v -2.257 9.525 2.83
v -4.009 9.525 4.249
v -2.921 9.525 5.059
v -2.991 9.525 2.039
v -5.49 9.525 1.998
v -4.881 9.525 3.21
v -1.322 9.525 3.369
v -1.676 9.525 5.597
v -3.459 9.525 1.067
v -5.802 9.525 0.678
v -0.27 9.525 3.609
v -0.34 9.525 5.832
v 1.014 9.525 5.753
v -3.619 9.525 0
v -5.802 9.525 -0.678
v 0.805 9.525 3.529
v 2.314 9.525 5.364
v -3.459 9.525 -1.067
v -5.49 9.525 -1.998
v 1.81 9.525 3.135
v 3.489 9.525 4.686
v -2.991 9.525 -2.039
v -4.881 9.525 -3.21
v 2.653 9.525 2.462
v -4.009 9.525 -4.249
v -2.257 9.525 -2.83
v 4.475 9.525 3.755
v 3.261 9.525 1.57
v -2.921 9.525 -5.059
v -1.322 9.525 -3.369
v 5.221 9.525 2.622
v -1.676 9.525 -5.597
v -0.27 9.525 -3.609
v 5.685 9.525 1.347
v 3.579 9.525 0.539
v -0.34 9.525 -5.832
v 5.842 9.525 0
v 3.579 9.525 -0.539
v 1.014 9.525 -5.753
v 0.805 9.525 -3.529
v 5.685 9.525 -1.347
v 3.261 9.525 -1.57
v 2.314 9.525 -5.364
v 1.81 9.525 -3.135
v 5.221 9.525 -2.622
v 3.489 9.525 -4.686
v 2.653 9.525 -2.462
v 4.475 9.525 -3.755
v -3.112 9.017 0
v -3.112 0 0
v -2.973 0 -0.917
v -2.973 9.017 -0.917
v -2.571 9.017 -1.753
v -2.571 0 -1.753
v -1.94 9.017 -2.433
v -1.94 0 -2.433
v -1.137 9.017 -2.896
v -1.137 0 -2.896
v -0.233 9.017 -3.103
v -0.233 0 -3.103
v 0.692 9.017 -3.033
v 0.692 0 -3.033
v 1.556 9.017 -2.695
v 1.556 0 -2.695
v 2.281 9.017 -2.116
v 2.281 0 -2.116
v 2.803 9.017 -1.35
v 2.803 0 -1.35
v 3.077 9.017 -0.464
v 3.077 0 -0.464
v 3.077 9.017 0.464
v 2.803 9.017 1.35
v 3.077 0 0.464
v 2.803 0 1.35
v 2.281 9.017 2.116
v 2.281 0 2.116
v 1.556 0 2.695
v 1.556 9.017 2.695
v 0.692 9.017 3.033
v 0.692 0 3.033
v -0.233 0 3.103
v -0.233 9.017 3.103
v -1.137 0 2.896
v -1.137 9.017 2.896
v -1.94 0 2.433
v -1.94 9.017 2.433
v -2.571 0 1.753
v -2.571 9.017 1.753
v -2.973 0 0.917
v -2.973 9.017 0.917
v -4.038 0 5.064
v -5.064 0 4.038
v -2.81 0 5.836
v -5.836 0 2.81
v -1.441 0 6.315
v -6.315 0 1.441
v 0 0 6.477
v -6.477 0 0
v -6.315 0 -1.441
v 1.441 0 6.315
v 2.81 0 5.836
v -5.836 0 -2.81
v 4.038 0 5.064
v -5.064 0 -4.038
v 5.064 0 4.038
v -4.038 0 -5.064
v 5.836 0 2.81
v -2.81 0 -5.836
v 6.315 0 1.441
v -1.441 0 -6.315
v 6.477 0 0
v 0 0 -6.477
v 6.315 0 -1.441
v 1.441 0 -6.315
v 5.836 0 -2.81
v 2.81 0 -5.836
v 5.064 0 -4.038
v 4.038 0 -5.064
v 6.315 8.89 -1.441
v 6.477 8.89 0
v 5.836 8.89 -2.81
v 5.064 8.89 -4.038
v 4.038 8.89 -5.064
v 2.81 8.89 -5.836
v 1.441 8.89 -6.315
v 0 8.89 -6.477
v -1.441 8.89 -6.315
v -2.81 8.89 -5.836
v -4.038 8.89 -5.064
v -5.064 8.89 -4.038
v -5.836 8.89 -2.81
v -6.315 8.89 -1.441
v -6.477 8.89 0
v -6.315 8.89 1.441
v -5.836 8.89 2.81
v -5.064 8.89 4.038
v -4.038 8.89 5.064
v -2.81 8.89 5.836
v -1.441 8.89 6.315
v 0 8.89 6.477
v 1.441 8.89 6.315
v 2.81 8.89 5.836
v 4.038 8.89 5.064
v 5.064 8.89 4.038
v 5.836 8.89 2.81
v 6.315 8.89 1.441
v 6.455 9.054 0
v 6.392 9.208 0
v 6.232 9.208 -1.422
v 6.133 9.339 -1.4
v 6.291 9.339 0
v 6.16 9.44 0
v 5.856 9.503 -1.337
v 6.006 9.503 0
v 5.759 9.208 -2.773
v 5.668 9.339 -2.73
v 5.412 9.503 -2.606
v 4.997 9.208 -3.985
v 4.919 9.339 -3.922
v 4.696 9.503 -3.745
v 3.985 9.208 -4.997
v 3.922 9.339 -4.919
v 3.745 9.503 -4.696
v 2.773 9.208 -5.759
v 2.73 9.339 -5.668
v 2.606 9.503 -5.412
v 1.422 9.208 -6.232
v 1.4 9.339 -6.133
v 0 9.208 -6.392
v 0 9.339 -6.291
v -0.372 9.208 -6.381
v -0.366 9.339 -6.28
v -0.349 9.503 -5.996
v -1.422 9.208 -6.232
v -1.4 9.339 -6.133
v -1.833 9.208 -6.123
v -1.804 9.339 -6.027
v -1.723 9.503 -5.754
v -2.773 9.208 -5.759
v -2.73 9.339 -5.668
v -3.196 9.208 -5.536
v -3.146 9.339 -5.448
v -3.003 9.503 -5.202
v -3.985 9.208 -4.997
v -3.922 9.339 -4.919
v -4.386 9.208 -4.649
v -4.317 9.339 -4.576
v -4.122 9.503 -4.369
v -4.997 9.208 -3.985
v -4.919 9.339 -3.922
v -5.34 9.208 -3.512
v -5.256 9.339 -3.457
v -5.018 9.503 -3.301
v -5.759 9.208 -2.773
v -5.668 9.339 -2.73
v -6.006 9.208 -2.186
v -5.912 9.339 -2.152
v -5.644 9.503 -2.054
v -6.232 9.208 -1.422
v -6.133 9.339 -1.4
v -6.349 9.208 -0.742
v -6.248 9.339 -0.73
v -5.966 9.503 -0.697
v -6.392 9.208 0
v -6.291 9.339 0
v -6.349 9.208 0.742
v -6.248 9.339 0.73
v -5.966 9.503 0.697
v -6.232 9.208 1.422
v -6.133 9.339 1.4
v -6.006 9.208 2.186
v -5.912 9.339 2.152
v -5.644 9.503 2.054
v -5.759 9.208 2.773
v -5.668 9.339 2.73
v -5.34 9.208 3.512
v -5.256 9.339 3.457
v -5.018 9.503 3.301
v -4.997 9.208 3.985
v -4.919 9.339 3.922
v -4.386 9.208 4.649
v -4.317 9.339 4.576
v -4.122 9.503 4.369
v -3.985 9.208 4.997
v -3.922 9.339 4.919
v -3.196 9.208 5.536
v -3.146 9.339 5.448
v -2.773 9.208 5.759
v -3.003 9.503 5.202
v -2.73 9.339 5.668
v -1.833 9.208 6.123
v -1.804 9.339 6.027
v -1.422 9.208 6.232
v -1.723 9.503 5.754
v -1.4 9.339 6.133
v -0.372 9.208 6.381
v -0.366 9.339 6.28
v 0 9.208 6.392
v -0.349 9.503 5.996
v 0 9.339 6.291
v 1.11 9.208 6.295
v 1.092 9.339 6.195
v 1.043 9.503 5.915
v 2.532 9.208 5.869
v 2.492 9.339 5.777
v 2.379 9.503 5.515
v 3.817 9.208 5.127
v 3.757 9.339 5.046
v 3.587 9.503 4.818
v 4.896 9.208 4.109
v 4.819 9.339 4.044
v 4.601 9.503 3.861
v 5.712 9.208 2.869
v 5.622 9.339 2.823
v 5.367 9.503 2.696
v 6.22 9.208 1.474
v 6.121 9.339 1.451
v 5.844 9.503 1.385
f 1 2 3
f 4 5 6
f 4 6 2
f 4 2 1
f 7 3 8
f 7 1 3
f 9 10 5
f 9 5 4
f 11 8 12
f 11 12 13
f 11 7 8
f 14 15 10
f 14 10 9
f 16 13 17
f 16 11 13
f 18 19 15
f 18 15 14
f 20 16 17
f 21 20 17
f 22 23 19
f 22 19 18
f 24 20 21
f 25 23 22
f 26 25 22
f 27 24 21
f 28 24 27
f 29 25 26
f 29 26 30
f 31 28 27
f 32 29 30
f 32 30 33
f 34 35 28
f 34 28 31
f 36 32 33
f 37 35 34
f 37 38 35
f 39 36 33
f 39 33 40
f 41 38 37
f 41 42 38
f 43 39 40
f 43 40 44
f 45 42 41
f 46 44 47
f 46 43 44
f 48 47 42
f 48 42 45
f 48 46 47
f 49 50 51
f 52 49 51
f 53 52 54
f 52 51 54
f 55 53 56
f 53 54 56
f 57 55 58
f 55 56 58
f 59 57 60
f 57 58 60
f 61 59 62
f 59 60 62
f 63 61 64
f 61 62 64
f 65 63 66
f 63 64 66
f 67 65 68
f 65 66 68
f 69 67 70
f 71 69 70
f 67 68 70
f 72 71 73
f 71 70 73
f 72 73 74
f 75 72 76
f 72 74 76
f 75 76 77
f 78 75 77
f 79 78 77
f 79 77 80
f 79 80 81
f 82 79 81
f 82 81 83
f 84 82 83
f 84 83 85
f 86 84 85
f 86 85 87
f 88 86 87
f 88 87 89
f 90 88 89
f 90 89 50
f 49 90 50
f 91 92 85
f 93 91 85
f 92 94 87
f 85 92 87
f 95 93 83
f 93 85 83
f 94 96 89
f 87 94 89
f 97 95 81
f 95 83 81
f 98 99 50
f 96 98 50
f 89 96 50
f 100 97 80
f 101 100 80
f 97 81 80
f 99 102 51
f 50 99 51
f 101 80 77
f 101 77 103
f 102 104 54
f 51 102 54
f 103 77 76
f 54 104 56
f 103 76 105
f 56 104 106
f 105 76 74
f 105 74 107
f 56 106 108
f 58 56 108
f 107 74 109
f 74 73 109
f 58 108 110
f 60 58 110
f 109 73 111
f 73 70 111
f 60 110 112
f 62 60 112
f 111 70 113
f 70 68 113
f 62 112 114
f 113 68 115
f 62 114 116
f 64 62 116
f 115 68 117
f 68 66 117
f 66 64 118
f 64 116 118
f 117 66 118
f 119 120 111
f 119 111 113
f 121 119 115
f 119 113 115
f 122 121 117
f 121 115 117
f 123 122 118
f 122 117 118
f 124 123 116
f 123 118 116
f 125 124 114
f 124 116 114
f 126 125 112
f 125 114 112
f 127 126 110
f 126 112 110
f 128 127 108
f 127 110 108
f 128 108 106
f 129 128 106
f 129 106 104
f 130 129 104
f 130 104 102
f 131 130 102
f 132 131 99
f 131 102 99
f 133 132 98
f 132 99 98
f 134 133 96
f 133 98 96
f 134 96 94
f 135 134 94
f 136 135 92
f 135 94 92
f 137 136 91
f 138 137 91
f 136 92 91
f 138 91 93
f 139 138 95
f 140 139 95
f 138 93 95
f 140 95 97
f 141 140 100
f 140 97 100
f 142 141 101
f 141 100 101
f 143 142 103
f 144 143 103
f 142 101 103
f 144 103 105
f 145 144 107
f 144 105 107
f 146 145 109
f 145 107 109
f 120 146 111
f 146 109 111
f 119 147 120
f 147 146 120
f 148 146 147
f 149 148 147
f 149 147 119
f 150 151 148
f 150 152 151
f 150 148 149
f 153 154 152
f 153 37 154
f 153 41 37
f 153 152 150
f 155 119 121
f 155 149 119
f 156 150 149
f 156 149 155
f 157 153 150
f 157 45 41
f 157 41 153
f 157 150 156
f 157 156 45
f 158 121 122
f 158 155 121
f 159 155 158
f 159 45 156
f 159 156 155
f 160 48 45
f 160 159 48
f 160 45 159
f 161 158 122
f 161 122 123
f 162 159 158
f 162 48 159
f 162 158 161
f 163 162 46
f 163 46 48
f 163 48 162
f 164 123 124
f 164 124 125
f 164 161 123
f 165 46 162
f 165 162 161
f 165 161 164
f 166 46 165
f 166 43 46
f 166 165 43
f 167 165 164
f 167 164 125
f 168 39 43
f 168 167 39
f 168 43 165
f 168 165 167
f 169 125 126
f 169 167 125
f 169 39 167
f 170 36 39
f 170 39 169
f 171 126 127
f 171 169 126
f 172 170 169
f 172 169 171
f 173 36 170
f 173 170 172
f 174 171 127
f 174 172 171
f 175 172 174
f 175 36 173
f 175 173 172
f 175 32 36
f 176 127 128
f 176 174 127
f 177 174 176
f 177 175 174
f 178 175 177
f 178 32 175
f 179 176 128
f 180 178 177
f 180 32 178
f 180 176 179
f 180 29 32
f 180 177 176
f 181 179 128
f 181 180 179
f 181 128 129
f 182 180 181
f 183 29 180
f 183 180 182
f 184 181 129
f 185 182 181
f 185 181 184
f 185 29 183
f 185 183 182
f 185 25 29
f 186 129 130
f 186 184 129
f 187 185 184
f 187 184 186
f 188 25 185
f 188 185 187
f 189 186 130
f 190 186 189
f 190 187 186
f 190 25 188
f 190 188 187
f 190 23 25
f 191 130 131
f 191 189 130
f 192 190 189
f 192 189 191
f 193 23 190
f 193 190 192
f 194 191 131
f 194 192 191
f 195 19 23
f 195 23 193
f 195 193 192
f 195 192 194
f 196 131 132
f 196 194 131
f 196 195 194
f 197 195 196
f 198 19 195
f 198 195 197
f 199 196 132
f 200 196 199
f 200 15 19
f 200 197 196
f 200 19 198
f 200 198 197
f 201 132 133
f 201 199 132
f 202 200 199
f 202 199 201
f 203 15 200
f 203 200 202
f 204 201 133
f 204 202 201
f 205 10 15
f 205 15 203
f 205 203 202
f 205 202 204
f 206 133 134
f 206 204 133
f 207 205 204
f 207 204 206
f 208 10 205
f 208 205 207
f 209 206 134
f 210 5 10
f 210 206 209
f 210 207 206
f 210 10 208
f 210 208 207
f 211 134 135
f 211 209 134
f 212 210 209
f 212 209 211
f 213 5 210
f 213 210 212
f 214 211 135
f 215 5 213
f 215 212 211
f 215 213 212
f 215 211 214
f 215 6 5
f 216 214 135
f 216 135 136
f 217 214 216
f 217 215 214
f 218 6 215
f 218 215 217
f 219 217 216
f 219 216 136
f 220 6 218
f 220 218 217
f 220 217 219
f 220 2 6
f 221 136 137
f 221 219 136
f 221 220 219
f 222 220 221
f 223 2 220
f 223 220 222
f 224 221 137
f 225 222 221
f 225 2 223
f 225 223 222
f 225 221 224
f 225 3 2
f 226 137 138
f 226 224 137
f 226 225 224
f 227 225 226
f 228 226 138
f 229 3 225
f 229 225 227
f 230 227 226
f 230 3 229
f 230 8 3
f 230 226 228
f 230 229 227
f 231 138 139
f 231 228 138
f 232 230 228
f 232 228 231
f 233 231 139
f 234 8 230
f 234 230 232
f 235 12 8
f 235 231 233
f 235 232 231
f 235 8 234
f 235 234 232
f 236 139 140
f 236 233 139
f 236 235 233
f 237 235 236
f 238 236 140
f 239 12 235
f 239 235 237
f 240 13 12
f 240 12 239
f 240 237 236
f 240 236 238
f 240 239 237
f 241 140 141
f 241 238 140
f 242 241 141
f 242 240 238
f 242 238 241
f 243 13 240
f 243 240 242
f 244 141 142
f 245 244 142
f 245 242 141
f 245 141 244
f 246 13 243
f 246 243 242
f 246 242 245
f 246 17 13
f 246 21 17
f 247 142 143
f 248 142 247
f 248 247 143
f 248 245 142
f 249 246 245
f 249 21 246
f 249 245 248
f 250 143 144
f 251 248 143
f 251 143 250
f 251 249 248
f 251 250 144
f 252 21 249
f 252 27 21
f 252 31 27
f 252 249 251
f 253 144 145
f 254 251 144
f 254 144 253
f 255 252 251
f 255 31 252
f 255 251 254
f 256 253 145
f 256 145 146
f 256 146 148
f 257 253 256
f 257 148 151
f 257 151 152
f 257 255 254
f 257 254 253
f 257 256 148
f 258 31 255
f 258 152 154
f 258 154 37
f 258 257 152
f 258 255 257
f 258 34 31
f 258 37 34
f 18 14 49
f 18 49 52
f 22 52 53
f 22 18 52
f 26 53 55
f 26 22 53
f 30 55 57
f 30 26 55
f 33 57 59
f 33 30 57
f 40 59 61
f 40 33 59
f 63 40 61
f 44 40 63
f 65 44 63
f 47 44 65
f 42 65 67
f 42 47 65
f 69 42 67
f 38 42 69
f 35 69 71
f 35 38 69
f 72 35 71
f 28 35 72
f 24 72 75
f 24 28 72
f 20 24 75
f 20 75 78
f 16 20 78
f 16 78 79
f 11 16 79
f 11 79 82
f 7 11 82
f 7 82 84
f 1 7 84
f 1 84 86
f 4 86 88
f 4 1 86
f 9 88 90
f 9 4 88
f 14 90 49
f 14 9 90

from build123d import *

# Parameters (mm, degrees)
SKETCH1_R                   = 6.477
BOSS_EXTRUDE1_DEPTH         = 9.525
FILLET1_R                   = 0.635
F_1_4_20_TAPPED_HOLE1_D     = 6.223
F_1_4_20_TAPPED_HOLE1_DEPTH = 9.525
F_1_4_20_TAPPED_HOLE1_TIP   = 1.869577816
CHAMFER1_SIZE               = 0.508


with BuildPart() as part:
    # Sketch1 → Boss-Extrude1 (new body)
    with BuildSketch(Plane(origin=(0, 0, 0), x_dir=(1, 0, 0), z_dir=(0, 1, 0))):
        Circle(SKETCH1_R)
    extrude(amount=BOSS_EXTRUDE1_DEPTH)

    # Fillet1
    fillet1_edges = [part.edges().sort_by_distance(p)[0] for p in [
        (-6.477, 9.525, 0),
    ]]
    fillet(fillet1_edges, radius=FILLET1_R)

    # 1/4-20 Tapped Hole1
    with Locations(Plane(origin=(0, 9.525, 0), x_dir=(1, 0, 0), z_dir=(0, 1, 0))):
        with Locations((0, 0)):
            Hole(F_1_4_20_TAPPED_HOLE1_D / 2, depth=F_1_4_20_TAPPED_HOLE1_DEPTH)
            with Locations((0, 0, -(F_1_4_20_TAPPED_HOLE1_DEPTH + F_1_4_20_TAPPED_HOLE1_TIP / 2))):  # 118° drill point
                Cone(0, F_1_4_20_TAPPED_HOLE1_D / 2, F_1_4_20_TAPPED_HOLE1_TIP, mode=Mode.SUBTRACT)

    # Chamfer1
    chamfer1_edges = [part.edges().sort_by_distance(p)[0] for p in [
        (3.1115, 9.525, 0),
    ]]
    chamfer(chamfer1_edges, length=CHAMFER1_SIZE)


solid = part.part
